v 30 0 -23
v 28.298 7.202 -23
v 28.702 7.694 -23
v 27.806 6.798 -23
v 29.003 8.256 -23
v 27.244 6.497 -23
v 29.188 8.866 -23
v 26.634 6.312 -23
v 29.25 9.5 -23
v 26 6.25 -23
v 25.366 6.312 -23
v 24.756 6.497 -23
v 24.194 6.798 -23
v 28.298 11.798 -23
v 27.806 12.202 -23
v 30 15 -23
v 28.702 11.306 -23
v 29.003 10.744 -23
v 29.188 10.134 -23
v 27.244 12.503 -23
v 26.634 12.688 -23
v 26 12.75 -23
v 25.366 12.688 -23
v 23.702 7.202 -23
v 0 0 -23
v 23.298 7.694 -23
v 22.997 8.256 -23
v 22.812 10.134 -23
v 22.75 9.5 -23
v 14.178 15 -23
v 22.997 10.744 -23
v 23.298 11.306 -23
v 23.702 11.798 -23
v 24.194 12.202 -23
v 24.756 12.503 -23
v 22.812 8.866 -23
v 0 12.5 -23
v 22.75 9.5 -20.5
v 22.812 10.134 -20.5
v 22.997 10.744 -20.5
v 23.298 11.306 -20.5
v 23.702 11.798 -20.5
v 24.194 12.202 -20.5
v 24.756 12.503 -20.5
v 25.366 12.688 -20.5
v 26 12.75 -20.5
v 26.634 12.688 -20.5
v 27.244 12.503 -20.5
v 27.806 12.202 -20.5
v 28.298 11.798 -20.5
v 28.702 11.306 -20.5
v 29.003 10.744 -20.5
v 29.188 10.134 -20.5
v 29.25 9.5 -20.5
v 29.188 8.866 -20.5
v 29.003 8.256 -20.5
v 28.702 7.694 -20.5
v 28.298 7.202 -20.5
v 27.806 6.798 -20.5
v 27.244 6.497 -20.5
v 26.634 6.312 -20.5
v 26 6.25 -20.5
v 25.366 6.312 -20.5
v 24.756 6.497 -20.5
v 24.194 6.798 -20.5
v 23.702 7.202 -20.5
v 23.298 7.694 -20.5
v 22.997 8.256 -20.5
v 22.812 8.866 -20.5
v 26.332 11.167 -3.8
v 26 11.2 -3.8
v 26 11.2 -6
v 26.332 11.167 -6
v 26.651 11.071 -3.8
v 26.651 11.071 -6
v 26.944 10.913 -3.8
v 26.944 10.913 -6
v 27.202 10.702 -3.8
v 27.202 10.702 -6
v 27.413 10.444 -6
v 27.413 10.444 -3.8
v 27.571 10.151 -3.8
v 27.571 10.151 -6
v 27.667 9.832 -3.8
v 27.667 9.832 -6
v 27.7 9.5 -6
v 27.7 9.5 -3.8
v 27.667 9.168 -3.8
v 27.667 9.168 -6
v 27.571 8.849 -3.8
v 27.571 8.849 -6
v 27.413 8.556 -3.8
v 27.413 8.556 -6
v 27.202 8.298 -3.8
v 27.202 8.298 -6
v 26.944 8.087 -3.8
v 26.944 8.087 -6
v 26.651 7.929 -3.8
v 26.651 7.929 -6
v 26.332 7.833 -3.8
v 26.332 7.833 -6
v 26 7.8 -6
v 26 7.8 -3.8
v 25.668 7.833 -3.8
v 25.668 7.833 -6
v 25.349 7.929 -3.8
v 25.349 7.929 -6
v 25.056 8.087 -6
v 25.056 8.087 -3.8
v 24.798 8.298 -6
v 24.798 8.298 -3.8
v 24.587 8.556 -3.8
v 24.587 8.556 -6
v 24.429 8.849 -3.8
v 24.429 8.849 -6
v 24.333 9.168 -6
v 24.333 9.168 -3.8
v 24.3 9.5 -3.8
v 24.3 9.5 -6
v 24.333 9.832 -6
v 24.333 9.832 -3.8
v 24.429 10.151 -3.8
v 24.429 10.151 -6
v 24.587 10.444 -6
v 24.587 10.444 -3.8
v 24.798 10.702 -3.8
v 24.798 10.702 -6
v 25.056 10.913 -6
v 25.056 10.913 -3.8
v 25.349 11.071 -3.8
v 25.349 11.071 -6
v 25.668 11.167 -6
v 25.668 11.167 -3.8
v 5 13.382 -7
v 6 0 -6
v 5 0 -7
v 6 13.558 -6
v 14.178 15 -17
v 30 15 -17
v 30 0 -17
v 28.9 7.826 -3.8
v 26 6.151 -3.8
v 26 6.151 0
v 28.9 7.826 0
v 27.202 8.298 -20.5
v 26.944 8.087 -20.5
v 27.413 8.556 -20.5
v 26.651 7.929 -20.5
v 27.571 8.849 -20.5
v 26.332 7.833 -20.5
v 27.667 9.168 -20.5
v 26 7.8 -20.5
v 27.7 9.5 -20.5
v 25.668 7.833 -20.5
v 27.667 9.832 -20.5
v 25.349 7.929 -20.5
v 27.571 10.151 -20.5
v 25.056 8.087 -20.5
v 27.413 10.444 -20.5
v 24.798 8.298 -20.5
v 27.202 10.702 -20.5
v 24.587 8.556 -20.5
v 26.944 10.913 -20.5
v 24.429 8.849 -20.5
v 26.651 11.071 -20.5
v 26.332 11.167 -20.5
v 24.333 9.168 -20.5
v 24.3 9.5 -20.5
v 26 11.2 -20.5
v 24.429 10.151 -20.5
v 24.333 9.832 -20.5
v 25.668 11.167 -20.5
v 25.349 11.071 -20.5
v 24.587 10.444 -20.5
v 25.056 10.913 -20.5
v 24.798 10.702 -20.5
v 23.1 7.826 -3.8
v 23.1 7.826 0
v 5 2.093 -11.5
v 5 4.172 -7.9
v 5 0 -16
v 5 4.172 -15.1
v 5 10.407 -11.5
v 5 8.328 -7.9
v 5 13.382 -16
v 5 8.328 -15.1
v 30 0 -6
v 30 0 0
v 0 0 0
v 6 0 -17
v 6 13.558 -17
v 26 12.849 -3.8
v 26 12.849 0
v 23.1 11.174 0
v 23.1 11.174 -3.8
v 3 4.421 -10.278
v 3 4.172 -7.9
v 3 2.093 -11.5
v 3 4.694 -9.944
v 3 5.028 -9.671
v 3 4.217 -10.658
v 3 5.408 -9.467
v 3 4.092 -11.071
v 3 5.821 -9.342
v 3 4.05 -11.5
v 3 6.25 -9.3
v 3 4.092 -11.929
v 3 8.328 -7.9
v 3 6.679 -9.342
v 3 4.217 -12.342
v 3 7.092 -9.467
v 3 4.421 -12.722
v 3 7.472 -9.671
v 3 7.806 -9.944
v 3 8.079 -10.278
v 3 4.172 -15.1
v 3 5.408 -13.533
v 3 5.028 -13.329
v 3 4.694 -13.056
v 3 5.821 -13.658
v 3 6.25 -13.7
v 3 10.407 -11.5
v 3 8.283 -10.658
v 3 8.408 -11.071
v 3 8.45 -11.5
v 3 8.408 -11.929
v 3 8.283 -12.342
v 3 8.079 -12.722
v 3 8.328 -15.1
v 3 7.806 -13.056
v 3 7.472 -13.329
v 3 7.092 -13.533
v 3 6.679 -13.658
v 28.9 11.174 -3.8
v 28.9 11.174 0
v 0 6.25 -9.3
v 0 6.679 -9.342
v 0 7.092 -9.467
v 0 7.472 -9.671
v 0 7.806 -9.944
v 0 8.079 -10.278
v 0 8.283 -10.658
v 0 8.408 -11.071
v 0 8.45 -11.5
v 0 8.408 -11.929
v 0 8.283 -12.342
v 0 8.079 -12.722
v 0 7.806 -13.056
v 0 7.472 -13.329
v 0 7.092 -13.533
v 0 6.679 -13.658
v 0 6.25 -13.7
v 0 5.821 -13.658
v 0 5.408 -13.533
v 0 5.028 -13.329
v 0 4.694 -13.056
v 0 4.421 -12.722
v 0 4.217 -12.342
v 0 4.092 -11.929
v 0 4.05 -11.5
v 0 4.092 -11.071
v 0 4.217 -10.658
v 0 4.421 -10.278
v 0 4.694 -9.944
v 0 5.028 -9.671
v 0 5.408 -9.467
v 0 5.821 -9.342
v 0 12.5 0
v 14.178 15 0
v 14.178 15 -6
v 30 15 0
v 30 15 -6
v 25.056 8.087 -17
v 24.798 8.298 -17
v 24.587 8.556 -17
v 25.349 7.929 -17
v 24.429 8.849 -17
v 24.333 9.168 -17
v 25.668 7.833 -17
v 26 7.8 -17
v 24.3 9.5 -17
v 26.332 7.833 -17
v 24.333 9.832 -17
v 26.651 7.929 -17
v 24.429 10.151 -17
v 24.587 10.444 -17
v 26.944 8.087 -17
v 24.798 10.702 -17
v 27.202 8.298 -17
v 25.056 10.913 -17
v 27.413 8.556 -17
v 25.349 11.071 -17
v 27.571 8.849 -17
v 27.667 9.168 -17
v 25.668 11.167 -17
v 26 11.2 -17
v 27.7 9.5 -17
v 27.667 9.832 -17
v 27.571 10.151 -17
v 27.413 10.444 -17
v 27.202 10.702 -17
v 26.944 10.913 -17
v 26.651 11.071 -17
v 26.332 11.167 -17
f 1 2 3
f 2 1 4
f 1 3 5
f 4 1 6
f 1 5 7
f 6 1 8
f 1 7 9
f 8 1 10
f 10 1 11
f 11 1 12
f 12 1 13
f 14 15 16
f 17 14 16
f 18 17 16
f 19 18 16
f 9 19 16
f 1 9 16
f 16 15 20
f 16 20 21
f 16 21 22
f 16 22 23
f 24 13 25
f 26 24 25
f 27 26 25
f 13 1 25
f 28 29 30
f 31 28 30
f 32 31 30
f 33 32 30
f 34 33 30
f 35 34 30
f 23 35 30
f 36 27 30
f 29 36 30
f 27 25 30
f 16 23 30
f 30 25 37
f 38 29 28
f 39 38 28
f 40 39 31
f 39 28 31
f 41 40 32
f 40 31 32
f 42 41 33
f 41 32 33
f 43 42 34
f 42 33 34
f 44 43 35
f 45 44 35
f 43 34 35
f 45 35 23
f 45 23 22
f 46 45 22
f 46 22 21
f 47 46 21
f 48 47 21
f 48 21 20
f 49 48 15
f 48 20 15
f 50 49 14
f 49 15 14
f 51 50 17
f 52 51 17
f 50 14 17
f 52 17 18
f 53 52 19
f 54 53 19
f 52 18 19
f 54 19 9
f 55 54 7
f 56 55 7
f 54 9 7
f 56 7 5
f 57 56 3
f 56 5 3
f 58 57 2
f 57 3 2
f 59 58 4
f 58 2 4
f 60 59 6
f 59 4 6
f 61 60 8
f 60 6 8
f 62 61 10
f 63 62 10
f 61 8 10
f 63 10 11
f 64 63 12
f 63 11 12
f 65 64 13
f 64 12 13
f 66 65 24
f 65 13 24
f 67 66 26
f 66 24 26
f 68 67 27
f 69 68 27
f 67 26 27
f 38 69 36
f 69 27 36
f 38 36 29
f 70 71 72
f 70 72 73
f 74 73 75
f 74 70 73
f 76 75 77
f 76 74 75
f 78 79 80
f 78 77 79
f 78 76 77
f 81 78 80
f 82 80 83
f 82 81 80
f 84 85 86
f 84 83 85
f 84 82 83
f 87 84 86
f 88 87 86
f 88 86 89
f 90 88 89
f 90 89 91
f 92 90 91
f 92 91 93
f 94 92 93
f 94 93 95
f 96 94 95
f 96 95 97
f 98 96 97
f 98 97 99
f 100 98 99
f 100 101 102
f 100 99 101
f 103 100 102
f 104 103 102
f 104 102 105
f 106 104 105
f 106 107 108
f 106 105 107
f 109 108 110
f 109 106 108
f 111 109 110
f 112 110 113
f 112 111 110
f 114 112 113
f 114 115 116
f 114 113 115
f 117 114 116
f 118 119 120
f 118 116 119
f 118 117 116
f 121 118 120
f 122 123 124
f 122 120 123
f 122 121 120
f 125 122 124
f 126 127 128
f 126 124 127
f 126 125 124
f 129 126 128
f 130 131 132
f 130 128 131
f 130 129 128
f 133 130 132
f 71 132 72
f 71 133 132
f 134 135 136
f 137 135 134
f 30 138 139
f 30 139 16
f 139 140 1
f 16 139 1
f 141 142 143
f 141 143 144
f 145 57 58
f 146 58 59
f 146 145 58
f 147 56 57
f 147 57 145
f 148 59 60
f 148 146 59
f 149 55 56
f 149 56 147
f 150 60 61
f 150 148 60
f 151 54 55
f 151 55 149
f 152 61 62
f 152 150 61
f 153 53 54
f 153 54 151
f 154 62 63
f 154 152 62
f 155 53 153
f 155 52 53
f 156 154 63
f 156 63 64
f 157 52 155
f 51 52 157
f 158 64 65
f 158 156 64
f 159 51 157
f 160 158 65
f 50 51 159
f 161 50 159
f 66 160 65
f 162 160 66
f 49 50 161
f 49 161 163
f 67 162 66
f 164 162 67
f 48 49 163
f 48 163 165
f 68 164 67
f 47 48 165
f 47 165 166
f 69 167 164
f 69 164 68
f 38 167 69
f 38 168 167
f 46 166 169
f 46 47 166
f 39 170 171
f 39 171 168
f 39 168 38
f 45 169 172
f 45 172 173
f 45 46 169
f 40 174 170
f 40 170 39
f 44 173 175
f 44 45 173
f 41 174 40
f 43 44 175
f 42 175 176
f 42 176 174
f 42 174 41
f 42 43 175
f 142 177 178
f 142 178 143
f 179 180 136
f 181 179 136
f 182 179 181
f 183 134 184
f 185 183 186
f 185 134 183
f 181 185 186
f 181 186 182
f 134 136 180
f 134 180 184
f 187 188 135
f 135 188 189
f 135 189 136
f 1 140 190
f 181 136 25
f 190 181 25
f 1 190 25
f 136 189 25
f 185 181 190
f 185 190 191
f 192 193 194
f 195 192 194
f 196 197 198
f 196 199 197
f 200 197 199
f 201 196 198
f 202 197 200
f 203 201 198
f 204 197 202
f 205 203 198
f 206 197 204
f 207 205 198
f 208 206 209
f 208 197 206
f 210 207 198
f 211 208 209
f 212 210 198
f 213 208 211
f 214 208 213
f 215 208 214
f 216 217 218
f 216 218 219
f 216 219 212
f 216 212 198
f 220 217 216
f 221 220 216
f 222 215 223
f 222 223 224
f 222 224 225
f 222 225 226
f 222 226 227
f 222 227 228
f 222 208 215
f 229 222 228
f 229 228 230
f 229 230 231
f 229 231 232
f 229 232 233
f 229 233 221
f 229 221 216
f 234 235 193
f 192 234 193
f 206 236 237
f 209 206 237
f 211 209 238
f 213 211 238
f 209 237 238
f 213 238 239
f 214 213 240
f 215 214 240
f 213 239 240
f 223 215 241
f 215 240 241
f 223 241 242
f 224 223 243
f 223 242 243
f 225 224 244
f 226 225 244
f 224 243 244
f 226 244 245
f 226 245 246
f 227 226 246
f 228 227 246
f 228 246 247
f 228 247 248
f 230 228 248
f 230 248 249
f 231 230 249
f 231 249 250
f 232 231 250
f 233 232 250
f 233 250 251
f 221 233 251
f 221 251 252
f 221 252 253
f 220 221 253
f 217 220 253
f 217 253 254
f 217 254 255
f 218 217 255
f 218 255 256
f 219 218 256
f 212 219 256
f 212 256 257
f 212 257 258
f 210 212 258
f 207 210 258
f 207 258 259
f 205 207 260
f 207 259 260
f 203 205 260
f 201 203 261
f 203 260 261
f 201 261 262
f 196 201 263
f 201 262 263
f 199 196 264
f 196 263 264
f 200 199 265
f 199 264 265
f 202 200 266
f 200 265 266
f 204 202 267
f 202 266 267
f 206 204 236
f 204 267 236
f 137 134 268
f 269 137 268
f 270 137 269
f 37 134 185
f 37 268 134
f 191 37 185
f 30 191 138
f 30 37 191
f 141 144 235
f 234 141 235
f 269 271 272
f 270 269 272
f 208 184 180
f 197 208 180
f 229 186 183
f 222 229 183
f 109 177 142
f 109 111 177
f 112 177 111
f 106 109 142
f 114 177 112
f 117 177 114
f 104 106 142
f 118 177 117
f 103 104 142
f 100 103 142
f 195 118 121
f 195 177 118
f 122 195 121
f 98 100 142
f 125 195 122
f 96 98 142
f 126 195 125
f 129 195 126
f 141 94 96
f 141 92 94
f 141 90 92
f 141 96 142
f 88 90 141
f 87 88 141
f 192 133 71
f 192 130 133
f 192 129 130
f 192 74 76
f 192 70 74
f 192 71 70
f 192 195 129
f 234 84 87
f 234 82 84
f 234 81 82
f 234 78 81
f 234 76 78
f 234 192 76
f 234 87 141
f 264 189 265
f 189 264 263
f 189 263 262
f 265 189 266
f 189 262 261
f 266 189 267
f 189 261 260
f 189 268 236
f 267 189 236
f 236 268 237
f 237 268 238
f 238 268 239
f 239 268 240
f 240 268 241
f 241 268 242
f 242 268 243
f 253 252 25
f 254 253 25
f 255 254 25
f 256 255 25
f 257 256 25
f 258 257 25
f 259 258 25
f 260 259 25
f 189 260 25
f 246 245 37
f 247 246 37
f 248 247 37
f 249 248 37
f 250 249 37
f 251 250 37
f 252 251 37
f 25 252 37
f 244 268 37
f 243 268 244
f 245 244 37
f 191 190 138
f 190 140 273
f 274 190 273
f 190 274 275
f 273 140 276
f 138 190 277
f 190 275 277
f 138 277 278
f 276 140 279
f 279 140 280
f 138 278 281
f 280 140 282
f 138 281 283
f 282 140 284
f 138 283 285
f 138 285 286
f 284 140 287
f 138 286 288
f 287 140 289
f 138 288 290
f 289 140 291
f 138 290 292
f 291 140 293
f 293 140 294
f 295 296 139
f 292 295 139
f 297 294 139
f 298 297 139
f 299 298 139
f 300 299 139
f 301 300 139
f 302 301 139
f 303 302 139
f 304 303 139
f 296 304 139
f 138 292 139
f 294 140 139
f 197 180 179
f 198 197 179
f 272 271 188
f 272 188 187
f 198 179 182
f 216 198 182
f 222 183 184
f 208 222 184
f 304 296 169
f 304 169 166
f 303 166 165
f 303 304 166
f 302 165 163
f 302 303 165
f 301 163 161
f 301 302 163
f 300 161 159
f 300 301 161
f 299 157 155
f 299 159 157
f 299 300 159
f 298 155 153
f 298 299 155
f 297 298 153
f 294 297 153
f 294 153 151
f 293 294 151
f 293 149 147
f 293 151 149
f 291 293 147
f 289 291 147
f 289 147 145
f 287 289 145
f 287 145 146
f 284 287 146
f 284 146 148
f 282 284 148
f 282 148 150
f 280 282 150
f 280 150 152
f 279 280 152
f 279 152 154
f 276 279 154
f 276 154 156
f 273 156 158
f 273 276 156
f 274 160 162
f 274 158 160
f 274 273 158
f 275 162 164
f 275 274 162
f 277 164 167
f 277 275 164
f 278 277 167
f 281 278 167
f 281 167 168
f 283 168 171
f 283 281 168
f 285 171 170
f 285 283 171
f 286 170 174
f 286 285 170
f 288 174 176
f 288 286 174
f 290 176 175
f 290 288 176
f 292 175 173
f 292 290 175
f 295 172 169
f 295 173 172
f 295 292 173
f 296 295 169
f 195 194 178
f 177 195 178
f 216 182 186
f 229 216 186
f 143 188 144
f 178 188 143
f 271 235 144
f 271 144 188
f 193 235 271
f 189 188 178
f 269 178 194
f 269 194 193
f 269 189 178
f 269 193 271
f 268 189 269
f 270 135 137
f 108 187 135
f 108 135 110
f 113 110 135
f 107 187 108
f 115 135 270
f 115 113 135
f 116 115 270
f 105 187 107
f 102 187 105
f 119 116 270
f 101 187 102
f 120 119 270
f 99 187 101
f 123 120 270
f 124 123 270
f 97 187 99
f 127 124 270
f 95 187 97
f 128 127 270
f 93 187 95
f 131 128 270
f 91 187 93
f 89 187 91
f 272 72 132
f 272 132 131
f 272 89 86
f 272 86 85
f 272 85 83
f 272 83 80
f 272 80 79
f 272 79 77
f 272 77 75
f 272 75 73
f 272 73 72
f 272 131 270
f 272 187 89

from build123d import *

# Parameters (mm, degrees)
SKETCH1_W               = 23
SKETCH1_H               = 15
BOSS_EXTRUDE1_DEPTH     = 30
SKETCH2_W               = 11
SKETCH2_H               = 15
CUT_EXTRUDE1_DEPTH      = 25
CUT_EXTRUDE2_DEPTH      = 41.669398815
CUT_EXTRUDE2_DEPTH_BACK = 41.669398815
SKETCH3_R               = 1.7
CHAMFER1_SIZE           = 2.5
CHAMFER1_SIZE_2         = 14.178204549
SKETCH4_R               = 2.2
CUT_EXTRUDE3_DEPTH      = 10
CUT_EXTRUDE4_DEPTH      = 2
SKETCH6_R               = 3.25
CUT_EXTRUDE5_DEPTH      = 2.5
CUT_EXTRUDE6_DEPTH      = 3.8
CHAMFER3_SIZE           = 1


with BuildPart() as part:
    # Sketch1 → Boss-Extrude1 (new body)
    with BuildSketch(Plane(origin=(0, 0, 0), x_dir=(0, 0, -1), z_dir=(1, 0, 0))):
        with Locations((11.5, 7.5)):
            Rectangle(SKETCH1_W, SKETCH1_H)
    extrude(amount=BOSS_EXTRUDE1_DEPTH)

    # Sketch2 → Cut-Extrude1 (cut)
    with BuildSketch(Plane(origin=(30, 0, 0), x_dir=(0, 0, -1), z_dir=(1, 0, 0))):
        with Locations((11.5, 7.5)):
            Rectangle(SKETCH2_W, SKETCH2_H)
    extrude(amount=-CUT_EXTRUDE1_DEPTH, mode=Mode.SUBTRACT)

    # Sketch3 → Cut-Extrude2 (cut, two sides: drawn at the far end of the back side and taken through both)
    with BuildSketch(Plane(origin=(0, 0, -23), x_dir=(-1, 0, 0), z_dir=(0, 0, -1)).offset(-CUT_EXTRUDE2_DEPTH_BACK)):
        with Locations(Location((-26, 9.5, 0), (0, 0, 90))):
            Circle(SKETCH3_R)
    extrude(amount=CUT_EXTRUDE2_DEPTH + CUT_EXTRUDE2_DEPTH_BACK, mode=Mode.SUBTRACT)

    # Chamfer1
    # the kernel refuses this chamfer: 14.178204549, 2.5 mm, written as the material it takes off along each edge
    with BuildSketch(Plane(origin=(0, 15, -59.842614584), x_dir=(-0.21013876076743537, -0.9776715712462578, 0), z_dir=(0, 0, 1))) as chamfer1_piece_1:
        Polygon((CHAMFER1_SIZE * 0.977671571246, CHAMFER1_SIZE * 0.210138760767), (-CHAMFER1_SIZE_2 * 0.210138760768, CHAMFER1_SIZE_2 * 0.977671571249), (0, 0), align=None)
    extrude(amount=96.685229169, mode=Mode.SUBTRACT)

    # Sketch4 → Cut-Extrude3 (cut)
    with BuildSketch(Plane.ZY):
        with Locations((-11.5, 6.25)):
            Circle(SKETCH4_R)
    extrude(amount=-CUT_EXTRUDE3_DEPTH, mode=Mode.SUBTRACT)

    # Sketch5 → Cut-Extrude4 (cut)
    with BuildSketch(Plane(origin=(5, 0, 0), x_dir=(0, 0, -1), z_dir=(1, 0, 0))):
        Polygon((7.9, 8.328460969), (7.9, 4.171539031), (11.5, 2.093078062), (15.1, 4.171539031), (15.1, 8.328460969), (11.5, 10.406921938), align=None)
    extrude(amount=-CUT_EXTRUDE4_DEPTH, mode=Mode.SUBTRACT)

    # Sketch6 → Cut-Extrude5 (cut)
    with BuildSketch(Plane(origin=(0, 0, -23), x_dir=(-1, 0, 0), z_dir=(0, 0, -1))):
        with Locations((-26, 9.5)):
            Circle(SKETCH6_R)
    extrude(amount=-CUT_EXTRUDE5_DEPTH, mode=Mode.SUBTRACT)

    # Sketch7 → Cut-Extrude6 (cut)
    with BuildSketch(Plane.XY):
        Polygon((23.1, 11.174315781), (23.1, 7.825684219), (26, 6.151368439), (28.9, 7.825684219), (28.9, 11.174315781), (26, 12.848631561), align=None)
    extrude(amount=-CUT_EXTRUDE6_DEPTH, mode=Mode.SUBTRACT)

    # Chamfer3
    chamfer3_edges = [part.edges().sort_by_distance(p)[0] for p in [
        (5, 6.690817452, -17),
        (5, 6.690817452, -6),
    ]]
    chamfer(chamfer3_edges, length=CHAMFER3_SIZE)


solid = part.part
